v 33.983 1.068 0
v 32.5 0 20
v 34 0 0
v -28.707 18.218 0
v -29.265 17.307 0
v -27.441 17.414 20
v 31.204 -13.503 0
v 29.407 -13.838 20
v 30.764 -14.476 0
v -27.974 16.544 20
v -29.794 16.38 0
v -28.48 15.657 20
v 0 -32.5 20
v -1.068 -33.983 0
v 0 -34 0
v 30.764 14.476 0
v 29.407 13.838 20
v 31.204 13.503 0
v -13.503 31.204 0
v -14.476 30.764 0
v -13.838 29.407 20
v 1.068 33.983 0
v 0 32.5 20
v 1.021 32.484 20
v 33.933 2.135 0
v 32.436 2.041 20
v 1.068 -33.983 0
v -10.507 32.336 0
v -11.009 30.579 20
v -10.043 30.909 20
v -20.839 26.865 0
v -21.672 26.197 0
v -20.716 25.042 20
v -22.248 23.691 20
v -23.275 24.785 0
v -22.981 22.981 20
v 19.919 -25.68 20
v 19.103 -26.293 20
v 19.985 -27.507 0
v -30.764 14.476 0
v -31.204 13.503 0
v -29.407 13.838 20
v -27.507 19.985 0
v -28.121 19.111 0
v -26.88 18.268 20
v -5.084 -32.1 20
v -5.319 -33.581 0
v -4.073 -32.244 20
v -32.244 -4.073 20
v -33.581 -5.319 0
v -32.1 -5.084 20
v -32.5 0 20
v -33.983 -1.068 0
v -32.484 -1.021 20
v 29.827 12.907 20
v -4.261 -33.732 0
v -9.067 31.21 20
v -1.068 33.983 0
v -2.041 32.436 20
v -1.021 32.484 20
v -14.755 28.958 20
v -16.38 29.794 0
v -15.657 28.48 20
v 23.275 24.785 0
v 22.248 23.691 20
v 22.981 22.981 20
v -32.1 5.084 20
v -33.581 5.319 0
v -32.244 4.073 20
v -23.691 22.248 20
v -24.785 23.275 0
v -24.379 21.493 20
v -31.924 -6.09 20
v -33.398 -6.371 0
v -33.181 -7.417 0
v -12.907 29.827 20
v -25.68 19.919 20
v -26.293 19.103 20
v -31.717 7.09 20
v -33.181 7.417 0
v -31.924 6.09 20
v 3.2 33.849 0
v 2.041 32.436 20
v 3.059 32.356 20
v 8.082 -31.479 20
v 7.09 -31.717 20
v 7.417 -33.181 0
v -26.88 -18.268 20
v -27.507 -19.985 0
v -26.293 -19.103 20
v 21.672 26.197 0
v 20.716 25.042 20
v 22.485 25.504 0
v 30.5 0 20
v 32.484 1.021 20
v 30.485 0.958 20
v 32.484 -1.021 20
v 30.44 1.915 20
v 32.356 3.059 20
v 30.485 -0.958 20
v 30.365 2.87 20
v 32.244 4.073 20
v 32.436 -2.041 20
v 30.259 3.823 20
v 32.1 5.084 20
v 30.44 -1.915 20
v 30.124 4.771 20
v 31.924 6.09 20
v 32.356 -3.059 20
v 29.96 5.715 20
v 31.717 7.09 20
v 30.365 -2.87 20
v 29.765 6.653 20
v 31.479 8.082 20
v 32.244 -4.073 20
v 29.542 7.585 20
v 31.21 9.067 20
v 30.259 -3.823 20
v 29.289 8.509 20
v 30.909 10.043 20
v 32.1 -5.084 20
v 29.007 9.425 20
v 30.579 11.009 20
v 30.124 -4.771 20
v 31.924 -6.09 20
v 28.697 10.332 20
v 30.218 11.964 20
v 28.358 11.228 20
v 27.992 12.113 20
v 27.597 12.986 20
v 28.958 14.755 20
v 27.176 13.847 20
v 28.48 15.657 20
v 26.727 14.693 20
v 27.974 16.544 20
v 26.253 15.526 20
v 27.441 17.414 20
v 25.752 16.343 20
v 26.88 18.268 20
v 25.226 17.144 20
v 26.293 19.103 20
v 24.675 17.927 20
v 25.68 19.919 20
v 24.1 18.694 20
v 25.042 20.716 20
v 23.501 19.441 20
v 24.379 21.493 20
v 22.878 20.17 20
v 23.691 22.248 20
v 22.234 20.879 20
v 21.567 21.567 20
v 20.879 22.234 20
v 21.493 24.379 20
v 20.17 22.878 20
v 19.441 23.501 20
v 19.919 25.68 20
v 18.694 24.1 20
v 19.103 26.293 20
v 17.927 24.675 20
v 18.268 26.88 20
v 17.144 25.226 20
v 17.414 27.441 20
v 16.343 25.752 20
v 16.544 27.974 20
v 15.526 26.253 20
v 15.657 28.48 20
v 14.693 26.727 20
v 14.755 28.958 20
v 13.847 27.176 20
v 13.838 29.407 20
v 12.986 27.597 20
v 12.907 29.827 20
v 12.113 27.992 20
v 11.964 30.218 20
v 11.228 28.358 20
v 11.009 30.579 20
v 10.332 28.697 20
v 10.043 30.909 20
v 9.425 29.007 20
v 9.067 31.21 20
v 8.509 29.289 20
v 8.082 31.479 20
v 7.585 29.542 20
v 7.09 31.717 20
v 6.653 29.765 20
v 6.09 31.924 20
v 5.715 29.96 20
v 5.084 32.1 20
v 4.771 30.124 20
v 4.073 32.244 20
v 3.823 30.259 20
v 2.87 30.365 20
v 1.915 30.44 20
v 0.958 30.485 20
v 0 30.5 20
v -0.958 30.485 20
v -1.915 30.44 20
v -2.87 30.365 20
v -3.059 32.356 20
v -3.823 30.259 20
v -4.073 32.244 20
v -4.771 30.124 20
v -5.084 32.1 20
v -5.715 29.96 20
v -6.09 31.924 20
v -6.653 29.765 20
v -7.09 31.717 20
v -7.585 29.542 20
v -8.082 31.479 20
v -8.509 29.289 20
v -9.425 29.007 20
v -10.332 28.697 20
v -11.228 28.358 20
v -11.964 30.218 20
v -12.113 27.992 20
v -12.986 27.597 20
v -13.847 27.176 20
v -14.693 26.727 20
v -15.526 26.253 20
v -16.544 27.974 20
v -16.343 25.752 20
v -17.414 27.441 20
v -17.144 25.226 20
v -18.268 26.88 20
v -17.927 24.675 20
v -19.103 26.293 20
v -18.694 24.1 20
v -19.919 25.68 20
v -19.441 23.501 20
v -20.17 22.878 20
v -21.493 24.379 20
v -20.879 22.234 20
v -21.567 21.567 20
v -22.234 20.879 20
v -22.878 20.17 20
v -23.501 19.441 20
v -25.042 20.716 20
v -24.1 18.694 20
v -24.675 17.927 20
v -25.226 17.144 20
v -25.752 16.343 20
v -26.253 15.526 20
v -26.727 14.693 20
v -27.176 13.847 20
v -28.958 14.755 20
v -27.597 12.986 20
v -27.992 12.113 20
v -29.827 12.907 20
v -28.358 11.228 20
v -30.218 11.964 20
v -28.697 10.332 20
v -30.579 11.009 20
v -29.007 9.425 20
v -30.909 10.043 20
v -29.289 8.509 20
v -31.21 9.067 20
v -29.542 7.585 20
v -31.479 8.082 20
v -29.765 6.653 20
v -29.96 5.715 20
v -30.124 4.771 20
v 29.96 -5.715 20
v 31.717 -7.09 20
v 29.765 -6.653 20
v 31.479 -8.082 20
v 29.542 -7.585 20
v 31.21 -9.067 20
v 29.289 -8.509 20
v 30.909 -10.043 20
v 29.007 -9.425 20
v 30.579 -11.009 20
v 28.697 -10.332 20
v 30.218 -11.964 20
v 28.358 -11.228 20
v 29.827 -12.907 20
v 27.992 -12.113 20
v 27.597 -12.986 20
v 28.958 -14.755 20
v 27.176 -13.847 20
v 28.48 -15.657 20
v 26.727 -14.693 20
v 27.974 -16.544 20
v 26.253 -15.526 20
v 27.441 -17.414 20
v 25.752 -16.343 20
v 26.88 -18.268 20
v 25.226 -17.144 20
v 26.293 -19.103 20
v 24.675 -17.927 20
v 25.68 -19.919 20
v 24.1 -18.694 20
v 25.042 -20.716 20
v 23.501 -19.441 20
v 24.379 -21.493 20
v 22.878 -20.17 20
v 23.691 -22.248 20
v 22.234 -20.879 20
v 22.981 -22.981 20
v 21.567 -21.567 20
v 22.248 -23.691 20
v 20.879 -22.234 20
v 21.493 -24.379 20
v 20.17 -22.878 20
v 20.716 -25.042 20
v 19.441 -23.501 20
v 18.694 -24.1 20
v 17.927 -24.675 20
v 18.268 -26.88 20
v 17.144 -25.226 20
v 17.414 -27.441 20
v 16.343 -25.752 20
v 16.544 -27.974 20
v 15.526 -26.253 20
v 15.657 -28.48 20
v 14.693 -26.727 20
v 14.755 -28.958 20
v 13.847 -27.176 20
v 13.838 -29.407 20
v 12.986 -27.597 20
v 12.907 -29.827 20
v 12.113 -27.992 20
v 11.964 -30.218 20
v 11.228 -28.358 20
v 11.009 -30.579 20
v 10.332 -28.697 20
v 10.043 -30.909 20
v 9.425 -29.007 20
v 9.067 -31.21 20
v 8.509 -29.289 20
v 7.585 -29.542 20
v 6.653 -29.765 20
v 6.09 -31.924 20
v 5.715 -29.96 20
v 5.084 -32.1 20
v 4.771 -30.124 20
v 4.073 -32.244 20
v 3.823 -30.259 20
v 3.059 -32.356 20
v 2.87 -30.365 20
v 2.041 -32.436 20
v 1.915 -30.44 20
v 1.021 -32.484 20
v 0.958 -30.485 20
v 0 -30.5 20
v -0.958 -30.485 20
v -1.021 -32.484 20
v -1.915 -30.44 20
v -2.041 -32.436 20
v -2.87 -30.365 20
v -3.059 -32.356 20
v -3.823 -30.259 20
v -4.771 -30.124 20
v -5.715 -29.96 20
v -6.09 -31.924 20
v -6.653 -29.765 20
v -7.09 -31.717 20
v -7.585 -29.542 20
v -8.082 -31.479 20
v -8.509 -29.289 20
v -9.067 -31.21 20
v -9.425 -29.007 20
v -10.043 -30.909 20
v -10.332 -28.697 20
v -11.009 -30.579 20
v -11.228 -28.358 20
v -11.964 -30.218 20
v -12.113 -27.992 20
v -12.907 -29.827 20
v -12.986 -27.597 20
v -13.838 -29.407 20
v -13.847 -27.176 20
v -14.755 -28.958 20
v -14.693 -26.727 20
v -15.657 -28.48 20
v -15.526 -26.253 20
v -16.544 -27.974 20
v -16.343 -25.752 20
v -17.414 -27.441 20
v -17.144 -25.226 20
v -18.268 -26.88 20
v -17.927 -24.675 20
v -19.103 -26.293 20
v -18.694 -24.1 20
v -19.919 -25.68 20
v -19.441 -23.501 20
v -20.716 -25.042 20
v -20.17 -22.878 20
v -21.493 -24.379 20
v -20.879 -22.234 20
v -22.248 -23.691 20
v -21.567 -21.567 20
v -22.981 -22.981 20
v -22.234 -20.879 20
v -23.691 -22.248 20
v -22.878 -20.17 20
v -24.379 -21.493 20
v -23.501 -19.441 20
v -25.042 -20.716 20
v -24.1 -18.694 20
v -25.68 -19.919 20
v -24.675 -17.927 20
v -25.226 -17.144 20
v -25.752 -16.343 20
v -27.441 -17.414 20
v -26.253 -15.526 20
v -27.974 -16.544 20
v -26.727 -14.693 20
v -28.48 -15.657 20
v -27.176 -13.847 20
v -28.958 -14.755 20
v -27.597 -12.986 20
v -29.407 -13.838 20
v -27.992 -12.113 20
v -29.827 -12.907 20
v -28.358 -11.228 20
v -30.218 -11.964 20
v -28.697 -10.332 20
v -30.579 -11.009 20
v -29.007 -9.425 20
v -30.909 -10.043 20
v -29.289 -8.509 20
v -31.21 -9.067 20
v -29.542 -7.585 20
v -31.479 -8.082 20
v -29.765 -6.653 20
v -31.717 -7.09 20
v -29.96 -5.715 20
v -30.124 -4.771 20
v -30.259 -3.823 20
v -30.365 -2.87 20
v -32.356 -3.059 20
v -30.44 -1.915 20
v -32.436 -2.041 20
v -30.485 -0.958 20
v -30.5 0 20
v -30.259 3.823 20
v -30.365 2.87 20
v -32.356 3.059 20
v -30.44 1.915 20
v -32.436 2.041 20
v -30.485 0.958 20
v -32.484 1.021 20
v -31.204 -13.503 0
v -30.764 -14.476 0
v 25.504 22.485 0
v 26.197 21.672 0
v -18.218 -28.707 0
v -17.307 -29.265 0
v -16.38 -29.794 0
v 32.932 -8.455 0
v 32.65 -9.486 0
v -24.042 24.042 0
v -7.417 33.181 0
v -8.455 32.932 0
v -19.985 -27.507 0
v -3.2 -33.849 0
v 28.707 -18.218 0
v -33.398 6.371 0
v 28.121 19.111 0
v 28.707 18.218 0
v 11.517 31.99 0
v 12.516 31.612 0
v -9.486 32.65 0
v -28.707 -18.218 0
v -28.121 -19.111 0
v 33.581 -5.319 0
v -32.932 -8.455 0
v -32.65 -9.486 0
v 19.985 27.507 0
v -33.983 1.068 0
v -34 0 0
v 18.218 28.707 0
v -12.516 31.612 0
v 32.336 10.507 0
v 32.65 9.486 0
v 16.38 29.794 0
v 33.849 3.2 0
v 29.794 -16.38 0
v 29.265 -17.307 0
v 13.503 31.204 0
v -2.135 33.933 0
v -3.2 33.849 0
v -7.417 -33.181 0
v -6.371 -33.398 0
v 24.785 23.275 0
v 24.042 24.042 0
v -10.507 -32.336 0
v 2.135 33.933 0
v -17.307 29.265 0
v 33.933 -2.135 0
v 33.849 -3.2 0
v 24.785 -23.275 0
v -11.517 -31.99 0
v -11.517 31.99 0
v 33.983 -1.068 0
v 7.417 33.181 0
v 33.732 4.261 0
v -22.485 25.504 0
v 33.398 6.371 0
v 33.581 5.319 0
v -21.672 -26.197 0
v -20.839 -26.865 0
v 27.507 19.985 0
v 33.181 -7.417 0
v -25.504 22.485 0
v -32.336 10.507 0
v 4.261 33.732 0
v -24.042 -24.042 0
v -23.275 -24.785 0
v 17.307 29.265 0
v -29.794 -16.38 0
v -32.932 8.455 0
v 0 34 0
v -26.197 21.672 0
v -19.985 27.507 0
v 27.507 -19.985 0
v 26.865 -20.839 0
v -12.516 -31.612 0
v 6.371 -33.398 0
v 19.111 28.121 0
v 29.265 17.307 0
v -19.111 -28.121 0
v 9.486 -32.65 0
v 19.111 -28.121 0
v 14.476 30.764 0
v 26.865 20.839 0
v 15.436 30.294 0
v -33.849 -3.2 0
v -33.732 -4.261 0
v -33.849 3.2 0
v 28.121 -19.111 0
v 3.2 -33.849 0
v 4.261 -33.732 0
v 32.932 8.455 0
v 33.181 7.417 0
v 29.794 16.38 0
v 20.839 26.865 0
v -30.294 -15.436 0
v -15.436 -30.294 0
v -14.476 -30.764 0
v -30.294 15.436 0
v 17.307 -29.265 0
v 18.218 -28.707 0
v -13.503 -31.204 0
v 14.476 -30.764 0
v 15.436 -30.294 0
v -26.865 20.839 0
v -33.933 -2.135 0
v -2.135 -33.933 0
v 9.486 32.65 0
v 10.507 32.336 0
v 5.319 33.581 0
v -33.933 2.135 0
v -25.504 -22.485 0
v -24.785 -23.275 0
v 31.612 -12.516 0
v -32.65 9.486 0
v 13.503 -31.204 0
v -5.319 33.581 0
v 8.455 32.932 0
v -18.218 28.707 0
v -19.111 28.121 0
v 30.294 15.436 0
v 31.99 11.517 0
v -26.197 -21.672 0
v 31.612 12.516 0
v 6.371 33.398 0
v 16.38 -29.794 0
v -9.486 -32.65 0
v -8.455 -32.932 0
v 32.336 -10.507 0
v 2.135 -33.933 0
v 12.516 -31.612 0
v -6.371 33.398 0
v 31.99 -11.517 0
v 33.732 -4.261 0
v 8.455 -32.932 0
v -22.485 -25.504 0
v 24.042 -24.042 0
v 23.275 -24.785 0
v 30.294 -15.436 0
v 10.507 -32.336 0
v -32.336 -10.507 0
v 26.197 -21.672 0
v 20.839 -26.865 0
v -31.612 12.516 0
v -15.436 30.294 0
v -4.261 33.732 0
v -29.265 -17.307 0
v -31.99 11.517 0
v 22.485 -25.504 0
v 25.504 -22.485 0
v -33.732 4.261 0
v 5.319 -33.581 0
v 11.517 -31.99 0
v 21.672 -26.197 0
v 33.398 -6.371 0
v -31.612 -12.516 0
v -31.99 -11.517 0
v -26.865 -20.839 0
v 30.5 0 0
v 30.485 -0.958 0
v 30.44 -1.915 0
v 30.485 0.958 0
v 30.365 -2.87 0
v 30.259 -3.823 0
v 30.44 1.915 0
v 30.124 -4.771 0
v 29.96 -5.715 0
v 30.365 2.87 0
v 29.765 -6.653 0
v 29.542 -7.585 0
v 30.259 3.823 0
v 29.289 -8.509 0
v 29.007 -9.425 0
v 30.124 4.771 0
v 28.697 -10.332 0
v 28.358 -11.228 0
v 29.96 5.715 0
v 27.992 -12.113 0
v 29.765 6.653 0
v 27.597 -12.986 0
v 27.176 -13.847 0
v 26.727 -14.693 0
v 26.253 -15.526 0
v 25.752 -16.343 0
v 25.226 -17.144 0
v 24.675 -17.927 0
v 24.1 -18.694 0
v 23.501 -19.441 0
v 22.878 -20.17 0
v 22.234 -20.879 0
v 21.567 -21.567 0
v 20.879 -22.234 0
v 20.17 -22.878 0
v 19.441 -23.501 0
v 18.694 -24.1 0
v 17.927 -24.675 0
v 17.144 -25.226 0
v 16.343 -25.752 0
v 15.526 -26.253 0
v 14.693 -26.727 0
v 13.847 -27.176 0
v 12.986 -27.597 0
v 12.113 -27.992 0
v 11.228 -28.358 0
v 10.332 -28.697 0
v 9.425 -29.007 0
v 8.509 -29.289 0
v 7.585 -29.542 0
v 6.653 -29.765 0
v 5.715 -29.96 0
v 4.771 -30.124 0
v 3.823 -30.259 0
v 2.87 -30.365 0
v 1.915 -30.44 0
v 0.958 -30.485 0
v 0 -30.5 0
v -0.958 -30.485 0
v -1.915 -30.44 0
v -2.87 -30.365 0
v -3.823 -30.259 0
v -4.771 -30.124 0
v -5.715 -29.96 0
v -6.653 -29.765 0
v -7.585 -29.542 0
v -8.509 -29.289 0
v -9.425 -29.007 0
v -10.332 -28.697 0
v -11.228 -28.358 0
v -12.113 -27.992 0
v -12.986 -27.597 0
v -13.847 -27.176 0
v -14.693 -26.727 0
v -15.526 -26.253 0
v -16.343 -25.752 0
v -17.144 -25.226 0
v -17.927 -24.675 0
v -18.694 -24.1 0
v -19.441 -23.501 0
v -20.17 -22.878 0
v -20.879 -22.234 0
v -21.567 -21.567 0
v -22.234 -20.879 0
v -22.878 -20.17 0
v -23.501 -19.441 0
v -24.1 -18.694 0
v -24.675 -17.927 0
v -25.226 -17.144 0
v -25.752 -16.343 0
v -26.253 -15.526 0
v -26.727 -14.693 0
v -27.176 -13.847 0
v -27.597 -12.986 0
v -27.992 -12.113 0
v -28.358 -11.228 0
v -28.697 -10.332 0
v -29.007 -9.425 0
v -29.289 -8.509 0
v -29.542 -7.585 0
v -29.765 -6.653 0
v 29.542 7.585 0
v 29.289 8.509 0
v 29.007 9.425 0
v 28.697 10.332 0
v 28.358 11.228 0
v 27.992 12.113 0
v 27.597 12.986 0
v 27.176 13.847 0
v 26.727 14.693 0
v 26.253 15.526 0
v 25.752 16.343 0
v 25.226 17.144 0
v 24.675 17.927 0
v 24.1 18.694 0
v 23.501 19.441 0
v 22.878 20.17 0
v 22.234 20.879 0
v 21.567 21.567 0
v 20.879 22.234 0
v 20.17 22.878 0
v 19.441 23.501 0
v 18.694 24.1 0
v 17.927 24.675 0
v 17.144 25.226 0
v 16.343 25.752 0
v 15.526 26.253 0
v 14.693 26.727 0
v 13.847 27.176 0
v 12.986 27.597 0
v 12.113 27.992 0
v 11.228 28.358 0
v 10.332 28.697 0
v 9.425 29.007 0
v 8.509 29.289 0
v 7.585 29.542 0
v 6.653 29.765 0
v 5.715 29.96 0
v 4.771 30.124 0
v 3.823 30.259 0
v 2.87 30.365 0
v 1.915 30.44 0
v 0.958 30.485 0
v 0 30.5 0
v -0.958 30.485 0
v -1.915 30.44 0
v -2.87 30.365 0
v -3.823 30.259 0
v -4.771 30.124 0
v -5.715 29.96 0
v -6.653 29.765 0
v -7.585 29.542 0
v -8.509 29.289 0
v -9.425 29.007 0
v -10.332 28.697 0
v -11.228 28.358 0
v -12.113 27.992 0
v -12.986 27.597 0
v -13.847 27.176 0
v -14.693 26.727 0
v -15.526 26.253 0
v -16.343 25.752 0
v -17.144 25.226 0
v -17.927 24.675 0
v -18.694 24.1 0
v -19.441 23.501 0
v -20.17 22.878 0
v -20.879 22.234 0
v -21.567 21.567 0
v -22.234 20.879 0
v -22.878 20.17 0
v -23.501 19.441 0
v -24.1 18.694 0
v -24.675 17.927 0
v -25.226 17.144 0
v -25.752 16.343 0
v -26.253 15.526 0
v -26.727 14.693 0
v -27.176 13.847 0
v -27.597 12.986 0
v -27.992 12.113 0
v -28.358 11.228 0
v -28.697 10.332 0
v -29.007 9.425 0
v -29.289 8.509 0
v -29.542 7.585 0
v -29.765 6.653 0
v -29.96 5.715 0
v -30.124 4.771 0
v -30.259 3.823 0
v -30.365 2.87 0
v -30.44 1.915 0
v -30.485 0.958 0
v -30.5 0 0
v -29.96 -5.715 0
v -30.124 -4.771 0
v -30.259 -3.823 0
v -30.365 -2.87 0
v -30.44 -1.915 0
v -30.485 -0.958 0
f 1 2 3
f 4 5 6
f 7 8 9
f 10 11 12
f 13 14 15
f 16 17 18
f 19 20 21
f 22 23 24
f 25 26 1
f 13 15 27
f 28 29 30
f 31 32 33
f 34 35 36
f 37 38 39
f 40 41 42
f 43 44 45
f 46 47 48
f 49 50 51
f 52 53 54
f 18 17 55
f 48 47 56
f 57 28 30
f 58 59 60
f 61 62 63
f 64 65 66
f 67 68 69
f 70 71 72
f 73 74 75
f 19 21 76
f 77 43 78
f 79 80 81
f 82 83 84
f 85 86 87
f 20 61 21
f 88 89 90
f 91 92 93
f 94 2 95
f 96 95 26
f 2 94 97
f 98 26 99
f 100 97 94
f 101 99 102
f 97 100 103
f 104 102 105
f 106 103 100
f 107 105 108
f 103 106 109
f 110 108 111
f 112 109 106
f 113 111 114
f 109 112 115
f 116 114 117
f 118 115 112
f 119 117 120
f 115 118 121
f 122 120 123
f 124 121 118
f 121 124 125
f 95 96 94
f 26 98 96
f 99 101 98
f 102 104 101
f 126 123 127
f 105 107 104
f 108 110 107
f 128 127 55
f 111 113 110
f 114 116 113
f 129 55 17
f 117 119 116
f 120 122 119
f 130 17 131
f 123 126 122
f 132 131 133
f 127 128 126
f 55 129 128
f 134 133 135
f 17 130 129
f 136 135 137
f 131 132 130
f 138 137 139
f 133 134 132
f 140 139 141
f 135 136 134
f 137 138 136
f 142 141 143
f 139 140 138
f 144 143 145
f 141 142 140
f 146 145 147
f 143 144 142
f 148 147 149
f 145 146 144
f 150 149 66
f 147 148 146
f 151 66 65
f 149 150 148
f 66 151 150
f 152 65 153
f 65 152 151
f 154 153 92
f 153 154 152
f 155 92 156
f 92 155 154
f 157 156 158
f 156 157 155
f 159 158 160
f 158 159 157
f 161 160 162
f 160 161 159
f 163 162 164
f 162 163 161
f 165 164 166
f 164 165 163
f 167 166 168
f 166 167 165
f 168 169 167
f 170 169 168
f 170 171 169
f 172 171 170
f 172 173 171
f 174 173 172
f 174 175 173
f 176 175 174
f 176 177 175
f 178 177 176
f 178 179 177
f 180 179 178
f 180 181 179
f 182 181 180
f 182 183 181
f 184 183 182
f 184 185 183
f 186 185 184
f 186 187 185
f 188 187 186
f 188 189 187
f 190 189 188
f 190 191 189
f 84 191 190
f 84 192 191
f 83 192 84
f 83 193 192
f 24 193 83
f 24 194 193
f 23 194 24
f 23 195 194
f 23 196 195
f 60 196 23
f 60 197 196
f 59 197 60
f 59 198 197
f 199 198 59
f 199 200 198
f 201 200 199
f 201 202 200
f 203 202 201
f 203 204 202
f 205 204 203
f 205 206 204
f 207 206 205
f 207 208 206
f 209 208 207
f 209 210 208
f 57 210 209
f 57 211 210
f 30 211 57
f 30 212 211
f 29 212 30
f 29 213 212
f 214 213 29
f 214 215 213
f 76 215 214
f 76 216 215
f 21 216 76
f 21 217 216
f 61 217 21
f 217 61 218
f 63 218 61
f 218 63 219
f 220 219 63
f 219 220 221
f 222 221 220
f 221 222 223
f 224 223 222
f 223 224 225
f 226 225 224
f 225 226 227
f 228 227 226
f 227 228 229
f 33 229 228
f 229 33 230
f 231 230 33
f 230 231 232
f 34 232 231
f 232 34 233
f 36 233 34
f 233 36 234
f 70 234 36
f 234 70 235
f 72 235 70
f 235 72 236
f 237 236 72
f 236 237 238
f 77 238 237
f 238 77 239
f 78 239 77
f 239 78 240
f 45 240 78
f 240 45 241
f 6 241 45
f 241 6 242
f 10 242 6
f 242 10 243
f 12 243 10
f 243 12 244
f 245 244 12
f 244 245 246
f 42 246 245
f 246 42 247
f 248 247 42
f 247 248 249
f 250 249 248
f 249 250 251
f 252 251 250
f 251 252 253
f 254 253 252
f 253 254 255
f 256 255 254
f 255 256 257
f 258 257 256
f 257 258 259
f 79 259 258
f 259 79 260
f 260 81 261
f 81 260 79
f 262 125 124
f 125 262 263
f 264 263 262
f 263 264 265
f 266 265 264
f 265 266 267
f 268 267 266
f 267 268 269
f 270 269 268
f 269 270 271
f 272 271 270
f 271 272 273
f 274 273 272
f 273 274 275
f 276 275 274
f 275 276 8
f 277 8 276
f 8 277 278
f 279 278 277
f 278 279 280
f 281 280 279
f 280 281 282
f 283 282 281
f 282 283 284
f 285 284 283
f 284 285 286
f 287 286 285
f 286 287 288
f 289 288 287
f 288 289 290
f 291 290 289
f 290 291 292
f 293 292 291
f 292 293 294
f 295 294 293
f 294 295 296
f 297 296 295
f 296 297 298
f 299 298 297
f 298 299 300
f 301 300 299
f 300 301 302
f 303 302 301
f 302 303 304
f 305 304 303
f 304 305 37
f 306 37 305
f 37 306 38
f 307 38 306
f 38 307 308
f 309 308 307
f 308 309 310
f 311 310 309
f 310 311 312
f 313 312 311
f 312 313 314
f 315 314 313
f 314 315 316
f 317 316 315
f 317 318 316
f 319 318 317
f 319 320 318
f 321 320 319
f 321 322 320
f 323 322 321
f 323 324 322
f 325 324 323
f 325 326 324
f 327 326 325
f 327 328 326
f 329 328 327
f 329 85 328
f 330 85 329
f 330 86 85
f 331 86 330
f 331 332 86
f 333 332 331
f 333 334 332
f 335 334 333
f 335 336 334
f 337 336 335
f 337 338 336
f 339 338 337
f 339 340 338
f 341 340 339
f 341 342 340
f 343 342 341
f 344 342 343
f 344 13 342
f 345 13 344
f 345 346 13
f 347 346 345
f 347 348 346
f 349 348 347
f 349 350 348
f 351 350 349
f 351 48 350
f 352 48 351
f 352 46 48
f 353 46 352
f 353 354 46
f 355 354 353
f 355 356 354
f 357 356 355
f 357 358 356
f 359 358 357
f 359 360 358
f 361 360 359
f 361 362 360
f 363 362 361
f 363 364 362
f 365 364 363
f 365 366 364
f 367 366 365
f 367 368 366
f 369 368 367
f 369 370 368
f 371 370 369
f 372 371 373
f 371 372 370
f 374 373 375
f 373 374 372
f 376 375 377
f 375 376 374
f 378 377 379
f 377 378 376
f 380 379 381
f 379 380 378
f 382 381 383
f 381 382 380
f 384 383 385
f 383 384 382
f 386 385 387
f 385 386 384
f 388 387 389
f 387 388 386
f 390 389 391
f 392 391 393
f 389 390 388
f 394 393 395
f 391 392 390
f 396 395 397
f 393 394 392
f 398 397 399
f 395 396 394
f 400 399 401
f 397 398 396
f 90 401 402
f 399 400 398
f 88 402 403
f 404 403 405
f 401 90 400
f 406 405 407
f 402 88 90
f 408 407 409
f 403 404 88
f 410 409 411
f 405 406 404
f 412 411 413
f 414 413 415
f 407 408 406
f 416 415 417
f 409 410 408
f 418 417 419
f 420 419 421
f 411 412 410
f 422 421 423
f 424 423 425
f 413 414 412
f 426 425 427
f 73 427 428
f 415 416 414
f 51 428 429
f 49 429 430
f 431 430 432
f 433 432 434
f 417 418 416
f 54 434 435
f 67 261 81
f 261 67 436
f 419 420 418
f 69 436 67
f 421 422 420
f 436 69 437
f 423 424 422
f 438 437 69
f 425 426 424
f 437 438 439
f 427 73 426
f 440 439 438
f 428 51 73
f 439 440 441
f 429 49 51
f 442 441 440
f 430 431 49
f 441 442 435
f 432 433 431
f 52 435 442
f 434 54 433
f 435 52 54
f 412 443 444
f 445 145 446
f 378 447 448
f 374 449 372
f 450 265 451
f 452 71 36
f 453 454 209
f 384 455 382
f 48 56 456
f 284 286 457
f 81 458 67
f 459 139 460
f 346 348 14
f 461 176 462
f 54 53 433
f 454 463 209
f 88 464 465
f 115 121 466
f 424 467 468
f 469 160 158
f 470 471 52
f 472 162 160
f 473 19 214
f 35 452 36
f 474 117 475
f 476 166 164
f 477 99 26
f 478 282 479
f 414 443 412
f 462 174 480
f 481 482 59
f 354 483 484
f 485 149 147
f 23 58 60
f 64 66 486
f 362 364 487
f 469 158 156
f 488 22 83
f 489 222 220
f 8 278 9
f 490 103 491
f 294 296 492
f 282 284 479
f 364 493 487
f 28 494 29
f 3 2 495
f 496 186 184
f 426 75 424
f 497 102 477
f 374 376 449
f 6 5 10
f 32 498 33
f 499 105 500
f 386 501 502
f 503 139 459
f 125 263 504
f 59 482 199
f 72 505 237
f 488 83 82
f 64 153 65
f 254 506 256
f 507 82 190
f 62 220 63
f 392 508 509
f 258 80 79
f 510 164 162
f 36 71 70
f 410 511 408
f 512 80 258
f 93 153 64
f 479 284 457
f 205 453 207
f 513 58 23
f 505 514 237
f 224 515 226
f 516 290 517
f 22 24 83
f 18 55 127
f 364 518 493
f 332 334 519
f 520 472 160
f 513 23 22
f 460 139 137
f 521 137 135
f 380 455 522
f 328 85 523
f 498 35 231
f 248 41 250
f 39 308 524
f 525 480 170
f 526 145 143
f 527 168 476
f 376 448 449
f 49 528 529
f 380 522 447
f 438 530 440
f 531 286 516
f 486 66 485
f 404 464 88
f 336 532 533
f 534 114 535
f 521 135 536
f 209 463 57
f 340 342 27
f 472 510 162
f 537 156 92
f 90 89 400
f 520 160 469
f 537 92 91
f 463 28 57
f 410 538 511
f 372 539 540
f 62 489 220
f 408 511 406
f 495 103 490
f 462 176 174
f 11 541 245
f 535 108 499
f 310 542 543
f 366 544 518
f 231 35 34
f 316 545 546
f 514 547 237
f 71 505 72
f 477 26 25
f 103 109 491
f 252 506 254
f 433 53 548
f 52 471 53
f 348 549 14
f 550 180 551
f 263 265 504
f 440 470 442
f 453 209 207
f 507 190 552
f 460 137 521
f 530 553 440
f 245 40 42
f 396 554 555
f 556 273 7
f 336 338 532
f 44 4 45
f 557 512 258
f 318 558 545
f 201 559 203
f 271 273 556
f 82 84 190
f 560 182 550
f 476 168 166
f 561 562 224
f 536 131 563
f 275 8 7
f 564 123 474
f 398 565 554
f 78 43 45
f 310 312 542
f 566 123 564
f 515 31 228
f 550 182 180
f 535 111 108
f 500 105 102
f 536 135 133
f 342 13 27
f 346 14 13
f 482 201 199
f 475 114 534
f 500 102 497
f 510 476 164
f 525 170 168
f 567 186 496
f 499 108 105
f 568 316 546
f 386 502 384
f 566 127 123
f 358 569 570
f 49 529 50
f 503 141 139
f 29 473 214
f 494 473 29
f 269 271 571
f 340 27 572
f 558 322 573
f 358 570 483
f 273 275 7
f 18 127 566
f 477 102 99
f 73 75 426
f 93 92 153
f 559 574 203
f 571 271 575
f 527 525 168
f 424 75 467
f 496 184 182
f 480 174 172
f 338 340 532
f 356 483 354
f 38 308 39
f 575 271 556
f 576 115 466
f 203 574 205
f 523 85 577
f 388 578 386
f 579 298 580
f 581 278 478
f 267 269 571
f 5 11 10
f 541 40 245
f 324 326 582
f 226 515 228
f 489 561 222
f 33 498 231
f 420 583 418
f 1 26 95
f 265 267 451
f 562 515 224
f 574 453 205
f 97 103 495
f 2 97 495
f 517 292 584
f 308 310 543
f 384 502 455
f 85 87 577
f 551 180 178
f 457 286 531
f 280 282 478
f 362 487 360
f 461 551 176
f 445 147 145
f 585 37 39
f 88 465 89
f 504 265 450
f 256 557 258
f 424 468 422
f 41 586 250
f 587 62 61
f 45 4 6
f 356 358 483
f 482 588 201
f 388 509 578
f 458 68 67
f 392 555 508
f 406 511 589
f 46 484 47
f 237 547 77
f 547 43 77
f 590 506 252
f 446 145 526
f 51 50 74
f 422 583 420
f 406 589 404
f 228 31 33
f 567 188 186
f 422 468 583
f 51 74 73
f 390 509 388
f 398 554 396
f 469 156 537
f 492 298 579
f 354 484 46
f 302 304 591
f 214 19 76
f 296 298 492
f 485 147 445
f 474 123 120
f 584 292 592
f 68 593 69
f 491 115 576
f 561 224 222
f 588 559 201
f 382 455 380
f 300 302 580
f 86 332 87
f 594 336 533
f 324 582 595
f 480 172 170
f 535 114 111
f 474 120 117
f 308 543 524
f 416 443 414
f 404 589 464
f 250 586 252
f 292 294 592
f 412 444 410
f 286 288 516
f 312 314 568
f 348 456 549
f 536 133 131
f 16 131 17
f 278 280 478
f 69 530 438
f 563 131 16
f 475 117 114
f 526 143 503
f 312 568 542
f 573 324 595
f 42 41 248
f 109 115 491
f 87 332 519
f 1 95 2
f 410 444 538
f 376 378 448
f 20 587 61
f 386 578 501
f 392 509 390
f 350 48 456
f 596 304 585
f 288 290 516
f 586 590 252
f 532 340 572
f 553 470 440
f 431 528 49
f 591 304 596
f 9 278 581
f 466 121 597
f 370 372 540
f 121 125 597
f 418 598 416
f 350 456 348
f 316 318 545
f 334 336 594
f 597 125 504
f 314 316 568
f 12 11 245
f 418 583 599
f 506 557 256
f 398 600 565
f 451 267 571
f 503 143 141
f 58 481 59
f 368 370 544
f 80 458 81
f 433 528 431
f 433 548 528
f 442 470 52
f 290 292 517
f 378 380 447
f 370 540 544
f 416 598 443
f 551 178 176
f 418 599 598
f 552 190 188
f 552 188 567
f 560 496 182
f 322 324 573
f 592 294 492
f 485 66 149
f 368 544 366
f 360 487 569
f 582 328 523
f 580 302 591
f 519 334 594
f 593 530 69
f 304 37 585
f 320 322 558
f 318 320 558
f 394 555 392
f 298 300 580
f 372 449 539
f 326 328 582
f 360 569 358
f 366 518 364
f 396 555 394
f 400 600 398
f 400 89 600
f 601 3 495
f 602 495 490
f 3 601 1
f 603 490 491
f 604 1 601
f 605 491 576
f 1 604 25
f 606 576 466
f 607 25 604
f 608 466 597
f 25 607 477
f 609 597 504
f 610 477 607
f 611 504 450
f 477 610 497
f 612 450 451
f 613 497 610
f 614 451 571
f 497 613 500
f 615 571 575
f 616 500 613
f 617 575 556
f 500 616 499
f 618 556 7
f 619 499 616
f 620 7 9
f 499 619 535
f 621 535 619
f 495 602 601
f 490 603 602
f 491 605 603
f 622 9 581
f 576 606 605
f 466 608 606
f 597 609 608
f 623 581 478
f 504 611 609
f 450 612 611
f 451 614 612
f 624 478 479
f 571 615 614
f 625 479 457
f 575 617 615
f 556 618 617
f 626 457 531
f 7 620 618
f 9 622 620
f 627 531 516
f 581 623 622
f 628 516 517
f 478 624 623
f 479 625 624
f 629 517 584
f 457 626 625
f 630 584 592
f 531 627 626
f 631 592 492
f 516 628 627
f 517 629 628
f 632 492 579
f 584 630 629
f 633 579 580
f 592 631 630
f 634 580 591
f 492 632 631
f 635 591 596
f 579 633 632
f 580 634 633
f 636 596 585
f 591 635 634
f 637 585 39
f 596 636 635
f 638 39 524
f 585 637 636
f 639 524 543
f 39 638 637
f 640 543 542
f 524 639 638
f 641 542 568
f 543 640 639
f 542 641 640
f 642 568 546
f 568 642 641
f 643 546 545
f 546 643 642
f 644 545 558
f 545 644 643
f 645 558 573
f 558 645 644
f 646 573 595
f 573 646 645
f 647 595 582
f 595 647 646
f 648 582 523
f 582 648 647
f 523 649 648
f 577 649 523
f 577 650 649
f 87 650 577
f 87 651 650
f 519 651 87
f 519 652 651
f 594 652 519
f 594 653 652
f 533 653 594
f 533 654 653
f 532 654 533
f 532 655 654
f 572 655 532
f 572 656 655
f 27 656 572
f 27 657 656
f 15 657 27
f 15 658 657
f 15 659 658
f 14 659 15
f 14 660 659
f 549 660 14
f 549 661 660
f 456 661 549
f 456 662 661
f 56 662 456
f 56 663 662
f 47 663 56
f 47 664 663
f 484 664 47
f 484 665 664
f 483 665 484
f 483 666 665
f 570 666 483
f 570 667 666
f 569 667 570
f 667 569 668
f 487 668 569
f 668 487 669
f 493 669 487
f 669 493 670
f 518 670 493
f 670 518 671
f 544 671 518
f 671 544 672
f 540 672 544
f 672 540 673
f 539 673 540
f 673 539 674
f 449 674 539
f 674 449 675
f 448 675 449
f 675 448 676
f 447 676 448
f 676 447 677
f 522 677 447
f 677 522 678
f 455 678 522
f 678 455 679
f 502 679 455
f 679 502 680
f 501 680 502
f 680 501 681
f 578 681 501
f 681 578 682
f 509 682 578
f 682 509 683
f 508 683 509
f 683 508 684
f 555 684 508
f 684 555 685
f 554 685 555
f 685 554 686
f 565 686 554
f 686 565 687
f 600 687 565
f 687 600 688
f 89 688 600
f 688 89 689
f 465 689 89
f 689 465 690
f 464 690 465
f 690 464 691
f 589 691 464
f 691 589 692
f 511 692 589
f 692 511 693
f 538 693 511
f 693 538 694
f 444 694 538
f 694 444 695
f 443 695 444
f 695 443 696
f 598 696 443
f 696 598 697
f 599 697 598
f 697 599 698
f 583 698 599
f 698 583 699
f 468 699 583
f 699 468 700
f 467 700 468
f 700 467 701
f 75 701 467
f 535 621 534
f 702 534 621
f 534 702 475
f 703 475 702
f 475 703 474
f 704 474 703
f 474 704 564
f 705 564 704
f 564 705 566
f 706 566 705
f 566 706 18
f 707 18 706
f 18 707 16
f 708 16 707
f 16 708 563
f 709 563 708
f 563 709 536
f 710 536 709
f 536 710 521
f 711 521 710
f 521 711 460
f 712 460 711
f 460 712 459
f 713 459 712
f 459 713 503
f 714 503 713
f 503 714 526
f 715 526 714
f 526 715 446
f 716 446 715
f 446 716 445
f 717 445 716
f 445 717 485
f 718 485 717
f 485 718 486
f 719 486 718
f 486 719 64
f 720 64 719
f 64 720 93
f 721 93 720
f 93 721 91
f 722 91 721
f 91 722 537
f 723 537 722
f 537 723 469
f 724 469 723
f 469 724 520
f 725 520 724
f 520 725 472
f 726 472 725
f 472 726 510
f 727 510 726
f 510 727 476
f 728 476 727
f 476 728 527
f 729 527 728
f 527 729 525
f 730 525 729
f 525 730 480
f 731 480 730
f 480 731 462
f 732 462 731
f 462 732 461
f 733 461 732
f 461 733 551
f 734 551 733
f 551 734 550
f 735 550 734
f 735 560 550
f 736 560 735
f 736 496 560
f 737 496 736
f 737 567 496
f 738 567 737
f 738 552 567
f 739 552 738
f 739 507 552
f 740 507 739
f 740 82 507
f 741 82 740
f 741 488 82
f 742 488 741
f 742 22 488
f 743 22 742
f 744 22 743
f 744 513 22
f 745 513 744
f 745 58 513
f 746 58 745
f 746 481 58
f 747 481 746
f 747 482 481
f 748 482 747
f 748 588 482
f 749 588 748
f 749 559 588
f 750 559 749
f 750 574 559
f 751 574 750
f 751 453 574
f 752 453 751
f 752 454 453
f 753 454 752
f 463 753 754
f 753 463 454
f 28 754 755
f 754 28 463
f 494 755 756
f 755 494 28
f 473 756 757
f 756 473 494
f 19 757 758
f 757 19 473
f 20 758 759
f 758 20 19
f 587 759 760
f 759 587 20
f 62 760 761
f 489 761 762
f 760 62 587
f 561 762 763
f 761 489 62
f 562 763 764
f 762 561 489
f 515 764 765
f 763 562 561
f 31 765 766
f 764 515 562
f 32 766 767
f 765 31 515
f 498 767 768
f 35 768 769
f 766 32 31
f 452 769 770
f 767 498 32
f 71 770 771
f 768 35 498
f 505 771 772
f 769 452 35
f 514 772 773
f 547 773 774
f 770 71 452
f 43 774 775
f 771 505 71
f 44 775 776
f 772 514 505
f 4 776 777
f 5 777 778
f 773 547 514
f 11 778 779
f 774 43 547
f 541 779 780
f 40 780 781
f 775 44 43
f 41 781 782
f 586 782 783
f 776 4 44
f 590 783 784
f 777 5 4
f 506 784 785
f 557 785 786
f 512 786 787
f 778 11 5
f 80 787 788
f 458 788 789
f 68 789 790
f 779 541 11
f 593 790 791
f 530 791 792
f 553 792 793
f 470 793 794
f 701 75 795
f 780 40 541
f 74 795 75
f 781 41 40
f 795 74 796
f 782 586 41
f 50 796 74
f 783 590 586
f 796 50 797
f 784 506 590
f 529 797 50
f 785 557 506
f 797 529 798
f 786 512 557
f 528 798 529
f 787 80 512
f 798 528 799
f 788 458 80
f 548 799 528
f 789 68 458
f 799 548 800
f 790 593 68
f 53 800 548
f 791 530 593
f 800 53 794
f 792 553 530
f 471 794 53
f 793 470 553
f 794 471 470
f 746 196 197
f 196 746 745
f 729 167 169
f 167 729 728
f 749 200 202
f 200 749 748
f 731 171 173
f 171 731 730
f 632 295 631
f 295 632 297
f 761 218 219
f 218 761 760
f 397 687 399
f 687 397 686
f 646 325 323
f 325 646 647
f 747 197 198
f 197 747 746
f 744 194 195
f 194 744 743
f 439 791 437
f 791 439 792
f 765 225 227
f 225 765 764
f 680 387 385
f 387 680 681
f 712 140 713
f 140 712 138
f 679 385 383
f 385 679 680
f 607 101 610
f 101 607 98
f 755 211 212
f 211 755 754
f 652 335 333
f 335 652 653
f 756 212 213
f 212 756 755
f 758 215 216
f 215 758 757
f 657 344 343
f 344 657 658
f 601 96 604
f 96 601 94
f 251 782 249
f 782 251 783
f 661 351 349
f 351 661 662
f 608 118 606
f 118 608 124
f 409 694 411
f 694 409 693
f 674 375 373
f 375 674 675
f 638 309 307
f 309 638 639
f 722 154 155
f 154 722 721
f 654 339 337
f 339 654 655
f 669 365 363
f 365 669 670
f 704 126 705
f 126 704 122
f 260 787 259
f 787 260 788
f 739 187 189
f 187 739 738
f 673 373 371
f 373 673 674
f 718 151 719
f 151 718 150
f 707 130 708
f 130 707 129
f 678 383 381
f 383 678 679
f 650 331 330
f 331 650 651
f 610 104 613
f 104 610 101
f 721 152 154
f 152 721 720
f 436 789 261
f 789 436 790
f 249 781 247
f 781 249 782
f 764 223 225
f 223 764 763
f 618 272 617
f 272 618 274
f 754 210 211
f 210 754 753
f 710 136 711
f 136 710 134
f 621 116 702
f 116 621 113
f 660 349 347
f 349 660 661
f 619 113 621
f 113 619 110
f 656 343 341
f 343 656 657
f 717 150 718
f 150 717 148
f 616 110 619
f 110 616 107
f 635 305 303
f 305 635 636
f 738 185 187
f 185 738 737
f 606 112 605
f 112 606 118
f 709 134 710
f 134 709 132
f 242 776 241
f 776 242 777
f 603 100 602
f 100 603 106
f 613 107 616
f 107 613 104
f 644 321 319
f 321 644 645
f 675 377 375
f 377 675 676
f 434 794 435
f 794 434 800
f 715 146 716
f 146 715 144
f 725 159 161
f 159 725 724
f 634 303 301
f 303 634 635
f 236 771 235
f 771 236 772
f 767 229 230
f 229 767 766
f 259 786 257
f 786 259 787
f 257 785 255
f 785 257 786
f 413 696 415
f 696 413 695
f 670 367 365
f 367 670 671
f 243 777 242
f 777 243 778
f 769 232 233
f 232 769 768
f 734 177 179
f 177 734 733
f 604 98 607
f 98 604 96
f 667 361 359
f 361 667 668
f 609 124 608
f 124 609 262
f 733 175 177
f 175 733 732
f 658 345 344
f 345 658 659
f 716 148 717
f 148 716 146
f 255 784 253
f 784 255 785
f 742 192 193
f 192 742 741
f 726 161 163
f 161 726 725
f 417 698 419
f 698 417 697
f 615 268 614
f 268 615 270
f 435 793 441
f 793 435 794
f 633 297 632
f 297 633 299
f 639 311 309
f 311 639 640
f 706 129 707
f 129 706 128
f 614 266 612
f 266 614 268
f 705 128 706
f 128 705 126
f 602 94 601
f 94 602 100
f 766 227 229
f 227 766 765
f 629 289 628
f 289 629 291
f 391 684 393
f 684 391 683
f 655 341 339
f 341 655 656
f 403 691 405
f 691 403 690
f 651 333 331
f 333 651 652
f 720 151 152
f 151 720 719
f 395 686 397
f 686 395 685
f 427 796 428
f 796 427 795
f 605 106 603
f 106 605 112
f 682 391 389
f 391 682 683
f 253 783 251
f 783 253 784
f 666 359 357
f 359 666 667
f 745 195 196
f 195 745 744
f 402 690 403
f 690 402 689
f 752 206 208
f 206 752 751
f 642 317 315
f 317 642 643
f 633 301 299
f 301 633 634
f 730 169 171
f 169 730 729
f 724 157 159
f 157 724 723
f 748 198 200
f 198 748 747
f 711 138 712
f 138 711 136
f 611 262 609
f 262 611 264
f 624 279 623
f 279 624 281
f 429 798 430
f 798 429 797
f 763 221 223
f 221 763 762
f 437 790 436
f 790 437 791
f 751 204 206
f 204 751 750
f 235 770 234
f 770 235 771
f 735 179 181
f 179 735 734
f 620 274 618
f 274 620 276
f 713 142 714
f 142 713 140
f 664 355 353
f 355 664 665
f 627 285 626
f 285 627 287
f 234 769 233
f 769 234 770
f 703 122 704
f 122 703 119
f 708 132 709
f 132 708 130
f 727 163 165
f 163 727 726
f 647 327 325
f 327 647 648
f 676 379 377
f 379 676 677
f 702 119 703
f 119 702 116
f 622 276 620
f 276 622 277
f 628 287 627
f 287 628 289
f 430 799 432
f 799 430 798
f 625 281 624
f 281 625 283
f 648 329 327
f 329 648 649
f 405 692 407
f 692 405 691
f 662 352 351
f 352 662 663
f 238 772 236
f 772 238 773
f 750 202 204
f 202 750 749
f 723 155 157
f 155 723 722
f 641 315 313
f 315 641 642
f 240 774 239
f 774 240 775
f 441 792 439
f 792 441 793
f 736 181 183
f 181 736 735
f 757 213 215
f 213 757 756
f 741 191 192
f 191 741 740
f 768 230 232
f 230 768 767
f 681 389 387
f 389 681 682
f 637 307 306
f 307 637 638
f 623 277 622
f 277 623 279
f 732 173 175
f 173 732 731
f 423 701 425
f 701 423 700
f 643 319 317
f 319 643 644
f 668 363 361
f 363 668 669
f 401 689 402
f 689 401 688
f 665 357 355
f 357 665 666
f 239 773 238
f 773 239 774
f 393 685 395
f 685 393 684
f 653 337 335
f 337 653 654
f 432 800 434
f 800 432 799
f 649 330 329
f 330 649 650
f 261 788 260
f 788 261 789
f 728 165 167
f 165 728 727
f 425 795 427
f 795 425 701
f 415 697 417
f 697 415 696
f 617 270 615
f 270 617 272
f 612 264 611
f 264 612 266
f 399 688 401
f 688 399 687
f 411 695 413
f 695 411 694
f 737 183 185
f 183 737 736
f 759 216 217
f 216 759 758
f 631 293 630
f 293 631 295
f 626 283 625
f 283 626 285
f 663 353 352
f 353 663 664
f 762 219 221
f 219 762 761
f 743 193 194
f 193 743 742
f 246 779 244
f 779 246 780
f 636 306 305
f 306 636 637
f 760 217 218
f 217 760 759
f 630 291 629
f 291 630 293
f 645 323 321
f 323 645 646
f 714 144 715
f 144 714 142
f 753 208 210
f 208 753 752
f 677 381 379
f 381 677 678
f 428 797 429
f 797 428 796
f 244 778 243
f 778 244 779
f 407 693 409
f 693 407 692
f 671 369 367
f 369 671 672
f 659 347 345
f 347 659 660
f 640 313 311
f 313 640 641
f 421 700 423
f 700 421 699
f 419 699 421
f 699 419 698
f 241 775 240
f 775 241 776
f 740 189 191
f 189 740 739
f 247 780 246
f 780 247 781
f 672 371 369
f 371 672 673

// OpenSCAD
outerDiammeter=68;
innerDiammeter=61;
conicVariation=3;
height=20;
difference ()
  {

		cylinder (d1=outerDiammeter,d2=outerDiammeter-conicVariation, h=height, $fn=200);
		cylinder (d=innerDiammeter, h=25, $fn=200);

  }
